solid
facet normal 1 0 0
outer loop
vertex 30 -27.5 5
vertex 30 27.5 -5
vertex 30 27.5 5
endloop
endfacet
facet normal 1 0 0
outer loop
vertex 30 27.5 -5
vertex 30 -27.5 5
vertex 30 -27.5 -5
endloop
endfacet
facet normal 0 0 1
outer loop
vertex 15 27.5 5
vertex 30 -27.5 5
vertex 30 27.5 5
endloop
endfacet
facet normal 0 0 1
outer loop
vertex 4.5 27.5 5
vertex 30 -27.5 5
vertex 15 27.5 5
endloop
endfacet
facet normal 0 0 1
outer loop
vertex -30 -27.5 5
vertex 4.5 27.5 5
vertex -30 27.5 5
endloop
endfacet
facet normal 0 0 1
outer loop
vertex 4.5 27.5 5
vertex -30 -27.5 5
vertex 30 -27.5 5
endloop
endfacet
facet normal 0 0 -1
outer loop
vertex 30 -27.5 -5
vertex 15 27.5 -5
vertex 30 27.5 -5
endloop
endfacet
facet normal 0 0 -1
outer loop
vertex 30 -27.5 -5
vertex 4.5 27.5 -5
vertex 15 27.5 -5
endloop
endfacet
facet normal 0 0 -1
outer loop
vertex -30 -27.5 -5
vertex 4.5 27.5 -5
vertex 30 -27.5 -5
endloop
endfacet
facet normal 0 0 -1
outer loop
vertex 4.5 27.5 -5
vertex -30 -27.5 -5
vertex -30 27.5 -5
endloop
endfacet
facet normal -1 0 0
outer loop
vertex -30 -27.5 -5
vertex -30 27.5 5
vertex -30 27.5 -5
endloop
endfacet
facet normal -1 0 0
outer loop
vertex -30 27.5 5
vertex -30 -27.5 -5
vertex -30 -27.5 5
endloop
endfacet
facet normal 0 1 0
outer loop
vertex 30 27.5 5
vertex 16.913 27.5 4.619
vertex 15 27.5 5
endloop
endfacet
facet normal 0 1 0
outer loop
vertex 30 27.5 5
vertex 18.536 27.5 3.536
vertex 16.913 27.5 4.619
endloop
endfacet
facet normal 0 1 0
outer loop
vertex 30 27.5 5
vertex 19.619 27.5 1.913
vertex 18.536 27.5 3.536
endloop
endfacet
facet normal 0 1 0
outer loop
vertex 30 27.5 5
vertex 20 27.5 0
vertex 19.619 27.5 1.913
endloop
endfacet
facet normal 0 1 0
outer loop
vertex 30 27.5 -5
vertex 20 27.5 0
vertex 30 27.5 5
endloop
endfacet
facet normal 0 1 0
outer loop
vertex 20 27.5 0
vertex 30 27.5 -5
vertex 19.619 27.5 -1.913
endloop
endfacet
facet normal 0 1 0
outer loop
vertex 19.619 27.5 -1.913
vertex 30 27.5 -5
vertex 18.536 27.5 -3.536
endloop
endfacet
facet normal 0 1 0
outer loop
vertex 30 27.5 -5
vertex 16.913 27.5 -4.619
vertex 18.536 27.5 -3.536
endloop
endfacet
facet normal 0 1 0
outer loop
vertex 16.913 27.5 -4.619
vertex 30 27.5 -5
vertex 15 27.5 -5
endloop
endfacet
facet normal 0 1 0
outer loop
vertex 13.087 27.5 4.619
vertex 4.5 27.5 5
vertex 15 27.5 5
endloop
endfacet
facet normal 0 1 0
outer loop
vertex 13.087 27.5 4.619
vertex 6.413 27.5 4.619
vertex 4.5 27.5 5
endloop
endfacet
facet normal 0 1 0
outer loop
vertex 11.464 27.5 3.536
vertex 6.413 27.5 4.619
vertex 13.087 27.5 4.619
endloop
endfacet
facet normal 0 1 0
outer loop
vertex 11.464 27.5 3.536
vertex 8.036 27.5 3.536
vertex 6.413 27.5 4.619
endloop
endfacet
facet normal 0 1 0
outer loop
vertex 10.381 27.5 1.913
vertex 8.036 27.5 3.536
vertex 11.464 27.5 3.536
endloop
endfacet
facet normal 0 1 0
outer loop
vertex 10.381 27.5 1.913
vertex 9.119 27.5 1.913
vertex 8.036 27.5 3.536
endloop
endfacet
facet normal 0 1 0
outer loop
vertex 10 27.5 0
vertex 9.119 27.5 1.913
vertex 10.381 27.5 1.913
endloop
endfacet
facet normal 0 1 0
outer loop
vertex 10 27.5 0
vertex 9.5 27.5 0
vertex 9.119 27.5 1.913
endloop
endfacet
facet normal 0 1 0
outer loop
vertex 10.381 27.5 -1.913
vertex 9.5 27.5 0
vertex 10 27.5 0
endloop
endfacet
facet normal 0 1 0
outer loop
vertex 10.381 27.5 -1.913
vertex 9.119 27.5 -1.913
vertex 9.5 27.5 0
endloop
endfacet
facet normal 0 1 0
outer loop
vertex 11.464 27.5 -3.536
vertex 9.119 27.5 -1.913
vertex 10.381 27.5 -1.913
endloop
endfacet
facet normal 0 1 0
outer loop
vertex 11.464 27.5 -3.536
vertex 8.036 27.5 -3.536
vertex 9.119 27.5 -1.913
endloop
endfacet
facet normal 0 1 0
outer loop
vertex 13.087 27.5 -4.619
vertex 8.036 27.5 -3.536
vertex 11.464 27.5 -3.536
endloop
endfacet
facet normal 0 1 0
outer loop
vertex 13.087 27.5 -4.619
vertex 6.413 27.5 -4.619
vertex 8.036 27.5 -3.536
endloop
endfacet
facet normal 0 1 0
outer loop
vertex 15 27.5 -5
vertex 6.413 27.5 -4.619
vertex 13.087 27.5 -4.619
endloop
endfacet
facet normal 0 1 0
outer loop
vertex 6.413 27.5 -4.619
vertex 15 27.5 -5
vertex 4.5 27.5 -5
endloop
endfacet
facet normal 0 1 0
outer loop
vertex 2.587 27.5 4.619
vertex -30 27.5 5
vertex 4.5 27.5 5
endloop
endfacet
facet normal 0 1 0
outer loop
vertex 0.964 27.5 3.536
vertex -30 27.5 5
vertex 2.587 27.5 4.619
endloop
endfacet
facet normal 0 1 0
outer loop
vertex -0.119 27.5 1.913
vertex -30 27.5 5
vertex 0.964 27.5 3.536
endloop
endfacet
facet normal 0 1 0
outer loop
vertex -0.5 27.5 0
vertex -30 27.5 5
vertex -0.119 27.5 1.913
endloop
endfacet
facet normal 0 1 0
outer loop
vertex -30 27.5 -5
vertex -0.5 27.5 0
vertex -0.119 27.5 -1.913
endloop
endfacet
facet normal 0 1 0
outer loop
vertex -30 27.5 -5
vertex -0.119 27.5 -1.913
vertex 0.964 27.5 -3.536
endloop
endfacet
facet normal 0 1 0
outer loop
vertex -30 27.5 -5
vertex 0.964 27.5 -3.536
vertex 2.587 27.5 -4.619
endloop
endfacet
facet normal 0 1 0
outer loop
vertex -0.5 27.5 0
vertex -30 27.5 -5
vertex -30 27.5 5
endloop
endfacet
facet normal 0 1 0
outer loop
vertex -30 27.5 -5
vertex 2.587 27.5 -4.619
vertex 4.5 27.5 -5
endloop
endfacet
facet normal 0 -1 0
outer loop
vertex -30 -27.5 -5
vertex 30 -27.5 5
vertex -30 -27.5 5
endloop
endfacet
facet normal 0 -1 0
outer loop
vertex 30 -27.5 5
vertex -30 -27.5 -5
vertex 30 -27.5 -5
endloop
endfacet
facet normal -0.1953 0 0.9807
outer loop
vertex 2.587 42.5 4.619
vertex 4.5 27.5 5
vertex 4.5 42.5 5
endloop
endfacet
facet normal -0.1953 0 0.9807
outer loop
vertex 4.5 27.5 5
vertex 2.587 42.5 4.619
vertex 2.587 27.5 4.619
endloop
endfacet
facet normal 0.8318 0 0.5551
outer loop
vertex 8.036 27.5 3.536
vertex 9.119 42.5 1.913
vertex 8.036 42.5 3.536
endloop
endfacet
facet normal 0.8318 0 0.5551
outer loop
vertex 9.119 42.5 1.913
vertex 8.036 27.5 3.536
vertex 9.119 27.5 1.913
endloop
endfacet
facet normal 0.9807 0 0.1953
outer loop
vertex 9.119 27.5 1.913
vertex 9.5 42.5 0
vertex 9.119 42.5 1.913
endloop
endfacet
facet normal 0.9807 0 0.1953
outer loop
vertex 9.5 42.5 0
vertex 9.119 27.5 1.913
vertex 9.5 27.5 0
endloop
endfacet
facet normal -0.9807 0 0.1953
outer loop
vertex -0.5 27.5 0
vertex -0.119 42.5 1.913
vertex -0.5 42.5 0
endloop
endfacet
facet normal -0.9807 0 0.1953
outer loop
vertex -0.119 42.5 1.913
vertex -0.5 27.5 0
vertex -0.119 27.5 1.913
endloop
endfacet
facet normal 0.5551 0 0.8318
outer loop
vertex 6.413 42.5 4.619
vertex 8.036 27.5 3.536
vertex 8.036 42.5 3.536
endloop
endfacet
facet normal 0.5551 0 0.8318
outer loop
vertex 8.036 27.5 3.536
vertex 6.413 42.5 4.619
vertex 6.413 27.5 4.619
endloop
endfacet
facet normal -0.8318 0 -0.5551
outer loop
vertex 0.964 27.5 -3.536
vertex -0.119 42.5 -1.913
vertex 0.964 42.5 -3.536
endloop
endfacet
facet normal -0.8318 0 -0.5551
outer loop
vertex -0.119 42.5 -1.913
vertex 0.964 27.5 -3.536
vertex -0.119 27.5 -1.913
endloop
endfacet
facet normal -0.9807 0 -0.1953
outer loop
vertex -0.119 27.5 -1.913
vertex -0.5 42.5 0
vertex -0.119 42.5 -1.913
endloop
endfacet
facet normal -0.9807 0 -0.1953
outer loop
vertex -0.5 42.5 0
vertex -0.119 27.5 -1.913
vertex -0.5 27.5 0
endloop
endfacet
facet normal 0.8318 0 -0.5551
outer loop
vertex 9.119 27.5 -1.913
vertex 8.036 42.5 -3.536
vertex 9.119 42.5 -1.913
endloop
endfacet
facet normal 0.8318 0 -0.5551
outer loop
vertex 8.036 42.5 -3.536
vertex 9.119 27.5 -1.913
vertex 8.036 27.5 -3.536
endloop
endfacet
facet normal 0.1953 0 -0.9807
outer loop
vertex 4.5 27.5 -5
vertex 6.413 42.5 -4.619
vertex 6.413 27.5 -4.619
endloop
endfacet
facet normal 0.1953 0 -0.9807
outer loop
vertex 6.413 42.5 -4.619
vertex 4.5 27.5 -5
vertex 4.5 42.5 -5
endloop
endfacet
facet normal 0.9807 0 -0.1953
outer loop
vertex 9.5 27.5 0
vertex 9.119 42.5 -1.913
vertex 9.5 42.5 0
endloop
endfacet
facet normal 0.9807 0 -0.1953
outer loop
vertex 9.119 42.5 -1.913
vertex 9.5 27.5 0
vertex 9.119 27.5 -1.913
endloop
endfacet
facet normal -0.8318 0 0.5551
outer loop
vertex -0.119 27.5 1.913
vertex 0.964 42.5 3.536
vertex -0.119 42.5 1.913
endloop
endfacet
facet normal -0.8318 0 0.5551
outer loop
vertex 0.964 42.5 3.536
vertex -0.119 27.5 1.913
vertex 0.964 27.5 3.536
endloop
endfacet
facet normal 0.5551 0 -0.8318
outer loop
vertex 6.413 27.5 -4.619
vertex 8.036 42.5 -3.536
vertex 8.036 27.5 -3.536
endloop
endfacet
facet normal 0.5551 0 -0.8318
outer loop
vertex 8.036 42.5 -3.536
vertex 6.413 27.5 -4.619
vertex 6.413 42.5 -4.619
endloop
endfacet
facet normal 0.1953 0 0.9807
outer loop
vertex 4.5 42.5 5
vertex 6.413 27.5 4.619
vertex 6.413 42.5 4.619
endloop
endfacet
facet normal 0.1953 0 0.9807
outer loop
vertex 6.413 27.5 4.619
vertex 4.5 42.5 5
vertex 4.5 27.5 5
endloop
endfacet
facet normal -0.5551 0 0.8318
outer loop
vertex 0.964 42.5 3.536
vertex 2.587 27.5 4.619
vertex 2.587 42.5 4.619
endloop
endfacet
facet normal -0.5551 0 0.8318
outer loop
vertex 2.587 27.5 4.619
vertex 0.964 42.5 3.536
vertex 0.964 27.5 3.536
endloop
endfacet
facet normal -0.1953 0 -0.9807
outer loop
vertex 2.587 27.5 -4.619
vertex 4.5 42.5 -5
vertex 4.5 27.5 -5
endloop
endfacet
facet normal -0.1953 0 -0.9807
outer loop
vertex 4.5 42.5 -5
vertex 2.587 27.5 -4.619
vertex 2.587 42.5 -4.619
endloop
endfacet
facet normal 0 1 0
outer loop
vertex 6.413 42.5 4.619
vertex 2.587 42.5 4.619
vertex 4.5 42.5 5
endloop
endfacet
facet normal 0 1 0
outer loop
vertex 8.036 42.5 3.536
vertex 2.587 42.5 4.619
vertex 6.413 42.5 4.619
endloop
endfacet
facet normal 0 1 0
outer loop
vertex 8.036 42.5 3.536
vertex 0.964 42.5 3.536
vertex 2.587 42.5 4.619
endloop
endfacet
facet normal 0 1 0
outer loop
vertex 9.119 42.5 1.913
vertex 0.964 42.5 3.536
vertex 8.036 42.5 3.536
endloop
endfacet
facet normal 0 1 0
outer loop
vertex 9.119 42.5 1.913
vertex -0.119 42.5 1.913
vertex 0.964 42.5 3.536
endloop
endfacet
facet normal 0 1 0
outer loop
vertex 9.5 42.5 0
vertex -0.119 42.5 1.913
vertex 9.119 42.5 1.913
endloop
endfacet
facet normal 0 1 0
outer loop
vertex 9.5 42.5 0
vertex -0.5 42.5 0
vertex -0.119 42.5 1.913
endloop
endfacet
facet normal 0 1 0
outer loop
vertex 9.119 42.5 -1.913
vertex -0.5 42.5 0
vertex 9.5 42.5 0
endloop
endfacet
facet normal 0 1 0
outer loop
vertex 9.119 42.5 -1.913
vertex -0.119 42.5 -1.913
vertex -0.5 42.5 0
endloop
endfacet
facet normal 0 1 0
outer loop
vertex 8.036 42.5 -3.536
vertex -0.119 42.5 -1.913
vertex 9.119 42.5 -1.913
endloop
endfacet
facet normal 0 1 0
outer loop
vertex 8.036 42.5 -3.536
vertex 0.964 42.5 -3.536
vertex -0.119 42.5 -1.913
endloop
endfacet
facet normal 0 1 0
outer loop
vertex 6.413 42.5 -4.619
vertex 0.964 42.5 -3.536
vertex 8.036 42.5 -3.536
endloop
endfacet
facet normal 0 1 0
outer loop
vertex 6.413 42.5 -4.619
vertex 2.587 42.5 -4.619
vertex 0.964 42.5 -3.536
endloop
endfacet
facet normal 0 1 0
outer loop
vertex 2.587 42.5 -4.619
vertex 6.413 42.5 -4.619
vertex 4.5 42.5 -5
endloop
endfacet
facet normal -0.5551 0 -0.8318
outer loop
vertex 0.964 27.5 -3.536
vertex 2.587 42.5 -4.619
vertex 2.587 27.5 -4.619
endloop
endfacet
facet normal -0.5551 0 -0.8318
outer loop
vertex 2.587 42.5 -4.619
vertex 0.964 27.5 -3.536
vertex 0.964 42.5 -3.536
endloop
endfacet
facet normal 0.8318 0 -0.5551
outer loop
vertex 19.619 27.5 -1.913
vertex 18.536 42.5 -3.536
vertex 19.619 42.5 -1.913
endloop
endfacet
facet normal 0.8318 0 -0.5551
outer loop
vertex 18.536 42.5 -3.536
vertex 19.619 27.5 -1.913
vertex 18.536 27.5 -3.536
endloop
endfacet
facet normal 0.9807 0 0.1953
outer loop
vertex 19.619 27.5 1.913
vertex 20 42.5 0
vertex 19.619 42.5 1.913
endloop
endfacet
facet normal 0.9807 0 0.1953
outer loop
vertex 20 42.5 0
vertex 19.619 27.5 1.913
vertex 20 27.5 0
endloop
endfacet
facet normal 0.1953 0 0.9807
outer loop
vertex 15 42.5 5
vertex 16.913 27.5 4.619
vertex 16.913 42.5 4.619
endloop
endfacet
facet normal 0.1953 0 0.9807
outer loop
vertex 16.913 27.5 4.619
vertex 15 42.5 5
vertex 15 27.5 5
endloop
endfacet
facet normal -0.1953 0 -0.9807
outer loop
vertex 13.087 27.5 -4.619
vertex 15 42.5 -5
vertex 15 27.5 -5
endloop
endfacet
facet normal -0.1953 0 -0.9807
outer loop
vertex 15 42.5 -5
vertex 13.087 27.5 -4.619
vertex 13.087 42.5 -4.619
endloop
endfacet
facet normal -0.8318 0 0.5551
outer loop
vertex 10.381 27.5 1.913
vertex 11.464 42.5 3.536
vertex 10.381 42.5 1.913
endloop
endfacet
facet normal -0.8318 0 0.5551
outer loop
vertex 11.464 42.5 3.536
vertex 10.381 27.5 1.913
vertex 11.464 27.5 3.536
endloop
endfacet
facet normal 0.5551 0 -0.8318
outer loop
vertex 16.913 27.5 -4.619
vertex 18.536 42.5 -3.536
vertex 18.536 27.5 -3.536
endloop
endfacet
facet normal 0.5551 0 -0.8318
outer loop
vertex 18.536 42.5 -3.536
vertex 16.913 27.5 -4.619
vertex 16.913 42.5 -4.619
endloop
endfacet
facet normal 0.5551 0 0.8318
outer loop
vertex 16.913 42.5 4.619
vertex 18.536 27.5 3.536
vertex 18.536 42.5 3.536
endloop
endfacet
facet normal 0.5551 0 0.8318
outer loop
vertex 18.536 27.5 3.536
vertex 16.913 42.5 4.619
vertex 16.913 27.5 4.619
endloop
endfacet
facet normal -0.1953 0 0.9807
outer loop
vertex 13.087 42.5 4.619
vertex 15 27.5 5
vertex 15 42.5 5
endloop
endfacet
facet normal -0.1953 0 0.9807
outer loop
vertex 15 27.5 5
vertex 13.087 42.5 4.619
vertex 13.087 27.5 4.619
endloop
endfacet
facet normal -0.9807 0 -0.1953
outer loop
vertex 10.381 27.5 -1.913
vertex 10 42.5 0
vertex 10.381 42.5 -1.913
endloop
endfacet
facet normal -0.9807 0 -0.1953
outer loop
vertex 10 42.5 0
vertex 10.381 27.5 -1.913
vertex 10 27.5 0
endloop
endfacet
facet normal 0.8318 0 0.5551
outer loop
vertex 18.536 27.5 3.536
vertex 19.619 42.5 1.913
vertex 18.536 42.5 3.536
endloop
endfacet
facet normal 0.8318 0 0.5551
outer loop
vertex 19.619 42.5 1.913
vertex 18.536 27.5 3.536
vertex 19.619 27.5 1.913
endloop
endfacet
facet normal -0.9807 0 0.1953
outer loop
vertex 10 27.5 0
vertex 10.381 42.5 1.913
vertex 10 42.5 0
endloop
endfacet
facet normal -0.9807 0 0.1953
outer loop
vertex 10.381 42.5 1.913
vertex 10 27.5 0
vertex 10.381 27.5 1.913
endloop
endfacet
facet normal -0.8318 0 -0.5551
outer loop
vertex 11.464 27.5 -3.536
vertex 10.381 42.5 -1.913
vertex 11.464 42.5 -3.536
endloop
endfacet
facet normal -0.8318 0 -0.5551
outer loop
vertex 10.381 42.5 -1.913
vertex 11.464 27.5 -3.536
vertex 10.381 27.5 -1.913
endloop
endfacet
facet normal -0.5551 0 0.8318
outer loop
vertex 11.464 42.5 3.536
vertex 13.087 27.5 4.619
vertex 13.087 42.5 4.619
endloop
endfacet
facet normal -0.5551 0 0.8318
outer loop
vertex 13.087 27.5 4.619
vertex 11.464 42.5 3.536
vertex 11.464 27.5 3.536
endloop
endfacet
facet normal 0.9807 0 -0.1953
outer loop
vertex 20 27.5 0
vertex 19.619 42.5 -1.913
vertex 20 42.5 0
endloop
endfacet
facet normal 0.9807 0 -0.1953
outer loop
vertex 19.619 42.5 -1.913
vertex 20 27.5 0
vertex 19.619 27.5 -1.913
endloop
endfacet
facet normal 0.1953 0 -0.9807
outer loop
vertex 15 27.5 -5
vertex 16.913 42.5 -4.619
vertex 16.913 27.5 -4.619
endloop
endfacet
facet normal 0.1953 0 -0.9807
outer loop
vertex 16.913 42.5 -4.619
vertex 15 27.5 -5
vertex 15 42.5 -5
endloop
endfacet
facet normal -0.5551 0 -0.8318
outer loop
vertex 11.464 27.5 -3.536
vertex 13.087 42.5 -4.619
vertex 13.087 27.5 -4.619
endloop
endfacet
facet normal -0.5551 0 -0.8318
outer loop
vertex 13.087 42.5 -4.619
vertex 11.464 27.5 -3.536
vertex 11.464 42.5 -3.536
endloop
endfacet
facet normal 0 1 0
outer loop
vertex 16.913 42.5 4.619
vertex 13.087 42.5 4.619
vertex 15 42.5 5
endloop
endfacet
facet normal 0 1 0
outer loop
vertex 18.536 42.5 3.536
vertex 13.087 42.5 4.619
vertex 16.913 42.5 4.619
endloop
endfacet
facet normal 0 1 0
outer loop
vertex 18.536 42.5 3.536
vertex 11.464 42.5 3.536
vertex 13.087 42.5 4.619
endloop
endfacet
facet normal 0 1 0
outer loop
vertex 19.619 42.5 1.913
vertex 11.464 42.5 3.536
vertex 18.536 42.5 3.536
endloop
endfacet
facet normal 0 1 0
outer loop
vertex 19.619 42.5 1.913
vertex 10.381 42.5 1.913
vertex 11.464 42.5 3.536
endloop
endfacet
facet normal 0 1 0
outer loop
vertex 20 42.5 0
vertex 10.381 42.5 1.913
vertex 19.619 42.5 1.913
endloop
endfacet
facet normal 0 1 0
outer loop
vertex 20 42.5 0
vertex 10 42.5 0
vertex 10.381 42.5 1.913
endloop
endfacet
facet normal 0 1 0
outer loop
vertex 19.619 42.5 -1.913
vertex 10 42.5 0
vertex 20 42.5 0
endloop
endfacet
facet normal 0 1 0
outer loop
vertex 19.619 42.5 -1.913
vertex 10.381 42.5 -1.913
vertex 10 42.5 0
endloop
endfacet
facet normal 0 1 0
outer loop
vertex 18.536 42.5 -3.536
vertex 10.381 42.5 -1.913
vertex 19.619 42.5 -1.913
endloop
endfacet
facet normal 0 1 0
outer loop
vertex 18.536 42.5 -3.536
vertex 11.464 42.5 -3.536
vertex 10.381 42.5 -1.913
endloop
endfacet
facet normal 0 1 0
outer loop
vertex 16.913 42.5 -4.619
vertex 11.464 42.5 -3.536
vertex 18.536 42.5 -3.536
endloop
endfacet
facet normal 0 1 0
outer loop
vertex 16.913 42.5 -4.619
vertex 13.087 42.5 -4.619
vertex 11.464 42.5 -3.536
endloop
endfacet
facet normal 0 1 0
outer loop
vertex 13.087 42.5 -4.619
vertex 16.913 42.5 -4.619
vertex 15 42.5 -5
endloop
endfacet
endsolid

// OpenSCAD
// file: params.scad
DOME_DIA = 150;
DOME_THICK = 2.5;
ORING_DIA = 5.4;

function r_from_dia(d) = d / 2;
// main file
include<params.scad>

module amp()
{
	cube([60,55,10], center=true);
    translate([4.5,35,0]) rotate([90,0,0])
	    cylinder(r=r_from_dia(10), h=15, center=true);
    translate([15,35,0]) rotate([90,0,0])
	    cylinder(r=r_from_dia(10), h=15, center=true);
}

amp();
